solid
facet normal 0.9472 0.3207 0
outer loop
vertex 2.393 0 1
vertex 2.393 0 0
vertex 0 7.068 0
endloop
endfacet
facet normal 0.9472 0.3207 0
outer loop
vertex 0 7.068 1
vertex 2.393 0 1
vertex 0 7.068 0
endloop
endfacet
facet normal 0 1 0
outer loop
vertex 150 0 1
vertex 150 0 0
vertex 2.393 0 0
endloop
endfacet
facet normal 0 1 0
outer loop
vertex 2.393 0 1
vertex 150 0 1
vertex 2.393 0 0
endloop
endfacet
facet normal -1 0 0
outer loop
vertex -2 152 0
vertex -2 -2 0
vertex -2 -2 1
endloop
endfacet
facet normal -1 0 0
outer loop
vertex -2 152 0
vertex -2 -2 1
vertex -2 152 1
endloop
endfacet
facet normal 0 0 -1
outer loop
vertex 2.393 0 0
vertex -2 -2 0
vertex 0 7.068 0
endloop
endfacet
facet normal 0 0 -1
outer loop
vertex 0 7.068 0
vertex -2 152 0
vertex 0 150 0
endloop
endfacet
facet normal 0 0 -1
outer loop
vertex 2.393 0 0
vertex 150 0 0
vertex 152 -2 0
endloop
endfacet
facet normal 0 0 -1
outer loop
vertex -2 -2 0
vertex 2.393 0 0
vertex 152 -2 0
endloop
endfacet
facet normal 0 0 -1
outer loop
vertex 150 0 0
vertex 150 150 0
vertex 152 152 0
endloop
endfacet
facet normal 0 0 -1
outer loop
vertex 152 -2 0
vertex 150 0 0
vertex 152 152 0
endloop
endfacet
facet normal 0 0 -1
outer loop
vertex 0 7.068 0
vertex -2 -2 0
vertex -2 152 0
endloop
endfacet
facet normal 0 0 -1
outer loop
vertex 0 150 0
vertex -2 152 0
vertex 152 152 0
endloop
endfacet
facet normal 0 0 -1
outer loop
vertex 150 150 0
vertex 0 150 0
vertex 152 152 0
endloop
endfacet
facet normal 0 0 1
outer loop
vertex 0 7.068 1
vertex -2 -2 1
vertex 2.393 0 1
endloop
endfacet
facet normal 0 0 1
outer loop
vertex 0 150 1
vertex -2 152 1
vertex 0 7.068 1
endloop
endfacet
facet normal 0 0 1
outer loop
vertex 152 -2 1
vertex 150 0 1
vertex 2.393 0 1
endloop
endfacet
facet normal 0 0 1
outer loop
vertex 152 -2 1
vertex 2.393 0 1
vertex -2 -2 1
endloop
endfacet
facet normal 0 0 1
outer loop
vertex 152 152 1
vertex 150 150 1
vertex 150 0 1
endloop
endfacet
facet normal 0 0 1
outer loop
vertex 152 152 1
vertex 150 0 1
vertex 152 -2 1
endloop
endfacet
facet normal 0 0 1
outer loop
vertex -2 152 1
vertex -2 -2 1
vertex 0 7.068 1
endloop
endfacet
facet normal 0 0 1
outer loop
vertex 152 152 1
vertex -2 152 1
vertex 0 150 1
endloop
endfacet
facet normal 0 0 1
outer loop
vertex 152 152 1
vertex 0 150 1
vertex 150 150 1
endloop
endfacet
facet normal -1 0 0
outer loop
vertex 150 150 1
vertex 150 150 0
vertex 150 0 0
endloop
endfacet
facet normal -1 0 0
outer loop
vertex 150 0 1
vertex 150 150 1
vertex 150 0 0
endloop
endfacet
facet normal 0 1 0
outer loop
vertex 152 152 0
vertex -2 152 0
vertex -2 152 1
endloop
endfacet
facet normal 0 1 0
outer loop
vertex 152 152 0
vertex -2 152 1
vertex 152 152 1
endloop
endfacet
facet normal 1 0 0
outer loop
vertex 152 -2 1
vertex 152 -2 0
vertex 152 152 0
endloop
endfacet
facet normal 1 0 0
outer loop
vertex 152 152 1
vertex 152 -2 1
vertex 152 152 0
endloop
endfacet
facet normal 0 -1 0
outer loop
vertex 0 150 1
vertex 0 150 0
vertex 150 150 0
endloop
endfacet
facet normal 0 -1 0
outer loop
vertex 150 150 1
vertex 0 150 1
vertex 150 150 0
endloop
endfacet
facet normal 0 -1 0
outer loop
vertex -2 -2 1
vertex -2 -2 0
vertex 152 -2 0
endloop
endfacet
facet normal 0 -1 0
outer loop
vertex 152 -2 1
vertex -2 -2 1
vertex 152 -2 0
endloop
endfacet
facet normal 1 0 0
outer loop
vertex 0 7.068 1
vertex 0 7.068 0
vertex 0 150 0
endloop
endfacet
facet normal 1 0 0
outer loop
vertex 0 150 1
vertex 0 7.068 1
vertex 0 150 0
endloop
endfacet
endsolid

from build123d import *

# Parameters (mm, degrees)
F0_W     = 154
F0_H     = 154
F1_DEPTH = 1


# Not quite as in the source:
# - a feature names something its author has since deleted; it is built from what else it names


with BuildPart() as f1:
    # F0 (on Top) → F1 (new body)
    with BuildSketch(Plane.XY):
        with Locations((75, 75)):
            Rectangle(F0_W, F0_H)
        Polygon((2.3926577996, 0), (0, 0), (0, 7.0679709315), (0, 150), (150, 150), (150, 0), align=None, mode=Mode.SUBTRACT)
        Polygon((0, 7.0679709315), (0, 0), (2.3926577996, 0), align=None)
    extrude(amount=F1_DEPTH)


solid = f1.part
